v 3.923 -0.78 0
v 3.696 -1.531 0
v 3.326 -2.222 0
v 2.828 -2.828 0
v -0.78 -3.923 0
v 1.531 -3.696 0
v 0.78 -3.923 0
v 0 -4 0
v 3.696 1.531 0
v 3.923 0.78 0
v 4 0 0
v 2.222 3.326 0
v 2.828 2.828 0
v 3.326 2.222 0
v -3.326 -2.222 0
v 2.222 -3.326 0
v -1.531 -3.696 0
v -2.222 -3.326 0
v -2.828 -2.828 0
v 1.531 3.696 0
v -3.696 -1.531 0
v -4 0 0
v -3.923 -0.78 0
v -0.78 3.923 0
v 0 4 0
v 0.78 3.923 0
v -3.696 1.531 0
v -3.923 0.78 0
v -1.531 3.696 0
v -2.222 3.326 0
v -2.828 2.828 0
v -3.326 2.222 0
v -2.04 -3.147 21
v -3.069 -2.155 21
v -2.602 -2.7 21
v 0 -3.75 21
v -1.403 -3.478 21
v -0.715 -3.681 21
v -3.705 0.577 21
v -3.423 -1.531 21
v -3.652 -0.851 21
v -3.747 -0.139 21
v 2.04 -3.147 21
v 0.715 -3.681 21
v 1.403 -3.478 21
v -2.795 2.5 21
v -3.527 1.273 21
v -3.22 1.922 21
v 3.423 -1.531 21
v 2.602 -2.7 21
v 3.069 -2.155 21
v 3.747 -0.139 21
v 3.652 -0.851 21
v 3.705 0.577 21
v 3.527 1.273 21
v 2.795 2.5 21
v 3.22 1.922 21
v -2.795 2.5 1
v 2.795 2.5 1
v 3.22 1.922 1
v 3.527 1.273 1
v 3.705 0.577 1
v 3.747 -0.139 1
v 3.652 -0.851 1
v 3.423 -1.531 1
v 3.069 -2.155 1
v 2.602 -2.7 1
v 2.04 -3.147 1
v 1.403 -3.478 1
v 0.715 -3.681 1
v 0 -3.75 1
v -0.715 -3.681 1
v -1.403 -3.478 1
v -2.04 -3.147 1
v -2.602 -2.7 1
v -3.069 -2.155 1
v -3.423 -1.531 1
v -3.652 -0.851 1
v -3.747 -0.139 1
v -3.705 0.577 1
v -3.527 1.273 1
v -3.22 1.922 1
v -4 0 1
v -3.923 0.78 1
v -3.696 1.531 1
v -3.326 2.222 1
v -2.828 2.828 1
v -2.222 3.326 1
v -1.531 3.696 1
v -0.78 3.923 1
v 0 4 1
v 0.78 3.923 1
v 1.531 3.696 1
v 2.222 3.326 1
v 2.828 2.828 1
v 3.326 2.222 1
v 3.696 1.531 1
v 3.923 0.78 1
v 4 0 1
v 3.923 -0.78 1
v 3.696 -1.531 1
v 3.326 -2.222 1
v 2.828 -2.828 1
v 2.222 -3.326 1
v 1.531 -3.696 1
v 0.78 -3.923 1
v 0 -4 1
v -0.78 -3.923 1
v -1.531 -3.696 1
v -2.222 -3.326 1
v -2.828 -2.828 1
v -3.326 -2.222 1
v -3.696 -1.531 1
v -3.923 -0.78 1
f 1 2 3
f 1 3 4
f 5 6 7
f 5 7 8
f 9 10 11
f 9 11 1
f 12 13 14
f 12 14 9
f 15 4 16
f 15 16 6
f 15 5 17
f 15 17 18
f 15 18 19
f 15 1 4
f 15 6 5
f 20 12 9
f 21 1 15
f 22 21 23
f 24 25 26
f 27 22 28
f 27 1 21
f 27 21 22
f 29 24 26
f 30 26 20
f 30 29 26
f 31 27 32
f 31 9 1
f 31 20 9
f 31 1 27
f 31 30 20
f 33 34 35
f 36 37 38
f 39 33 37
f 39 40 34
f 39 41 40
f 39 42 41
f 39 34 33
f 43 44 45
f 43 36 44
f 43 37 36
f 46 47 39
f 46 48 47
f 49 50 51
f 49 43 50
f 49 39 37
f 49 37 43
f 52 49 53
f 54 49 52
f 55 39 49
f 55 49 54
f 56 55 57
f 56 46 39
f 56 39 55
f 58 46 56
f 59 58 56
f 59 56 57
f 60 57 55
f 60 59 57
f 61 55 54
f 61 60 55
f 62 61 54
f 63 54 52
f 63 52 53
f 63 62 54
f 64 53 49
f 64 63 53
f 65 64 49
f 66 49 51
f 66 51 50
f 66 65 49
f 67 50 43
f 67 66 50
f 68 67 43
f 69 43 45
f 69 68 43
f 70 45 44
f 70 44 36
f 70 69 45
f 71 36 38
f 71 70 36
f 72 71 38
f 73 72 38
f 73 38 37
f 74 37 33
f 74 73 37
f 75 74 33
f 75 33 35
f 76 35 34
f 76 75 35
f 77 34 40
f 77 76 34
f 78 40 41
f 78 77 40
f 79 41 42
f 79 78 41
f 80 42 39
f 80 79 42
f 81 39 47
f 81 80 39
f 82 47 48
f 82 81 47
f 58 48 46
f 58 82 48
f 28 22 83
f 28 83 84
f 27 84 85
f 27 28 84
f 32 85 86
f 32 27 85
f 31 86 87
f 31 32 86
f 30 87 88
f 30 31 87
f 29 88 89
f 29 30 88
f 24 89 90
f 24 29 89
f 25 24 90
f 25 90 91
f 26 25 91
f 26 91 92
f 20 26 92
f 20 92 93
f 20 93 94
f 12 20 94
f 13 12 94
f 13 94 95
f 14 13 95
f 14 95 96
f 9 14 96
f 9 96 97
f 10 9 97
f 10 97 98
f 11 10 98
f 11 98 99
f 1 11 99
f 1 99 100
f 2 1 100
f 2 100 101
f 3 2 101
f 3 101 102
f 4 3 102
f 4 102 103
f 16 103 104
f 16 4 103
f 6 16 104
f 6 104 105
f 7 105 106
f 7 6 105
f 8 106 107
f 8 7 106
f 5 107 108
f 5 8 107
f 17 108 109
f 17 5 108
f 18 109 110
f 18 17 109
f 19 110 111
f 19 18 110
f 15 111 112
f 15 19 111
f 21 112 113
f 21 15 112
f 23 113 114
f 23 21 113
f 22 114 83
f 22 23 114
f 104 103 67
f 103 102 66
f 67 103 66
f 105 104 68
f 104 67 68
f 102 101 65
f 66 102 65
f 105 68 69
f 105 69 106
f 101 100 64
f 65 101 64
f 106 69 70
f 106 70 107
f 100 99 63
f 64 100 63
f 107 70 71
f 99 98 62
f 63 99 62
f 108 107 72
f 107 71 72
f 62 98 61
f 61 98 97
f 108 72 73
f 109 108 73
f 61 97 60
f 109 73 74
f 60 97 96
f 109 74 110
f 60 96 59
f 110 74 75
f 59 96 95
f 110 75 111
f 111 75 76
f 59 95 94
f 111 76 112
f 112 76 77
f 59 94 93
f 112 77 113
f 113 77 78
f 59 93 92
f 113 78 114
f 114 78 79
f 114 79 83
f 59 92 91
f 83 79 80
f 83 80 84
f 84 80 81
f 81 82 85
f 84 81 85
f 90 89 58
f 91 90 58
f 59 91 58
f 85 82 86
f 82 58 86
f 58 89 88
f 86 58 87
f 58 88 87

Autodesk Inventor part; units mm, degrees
ref_plane "YZ Plane" through (0, 0, 0) normal (1, 0, 0) x (0, 1, 0)
ref_plane "XZ Plane" through (0, 0, 0) normal (0, 1, 0) x (-1, 0, 0)
ref_plane "XY Plane" through (0, 0, 0) normal (0, 0, 1) x (1, 0, 0)
sketch "Sketch1" plane through (0, 0, 0) normal (0, 0, 1) x (1, 0, 0)
  circle A0 centre (0, 0) radius 3.75
  dimension "d0" = 7.5
extrude "Extrusion1" add sketch "Sketch1" along normal blind 21
sketch "Sketch2" plane through (0, 0, 21) normal (0, 0, 1) x (1, 0, 0)
  circle A0 centre (0, 0) radius 3.75 projected
  line L0 (-2.7951, 2.5) -> (2.7951, 2.5)
  dimension "d3" = 2.5
extrude "Extrusion2" cut sketch "Sketch2" against normal through all contours L0 A0 picked at (-0.7066, 2.6978)
sketch "Sketch3" plane through (0, 0, 0) normal (0, 0, -1) x (-1, 0, 0)
  circle A0 centre (0, 0) radius 4
  dimension "d6" = 8
extrude "Extrusion3" add sketch "Sketch3" against normal blind 1
properties material "Stainless Steel"
